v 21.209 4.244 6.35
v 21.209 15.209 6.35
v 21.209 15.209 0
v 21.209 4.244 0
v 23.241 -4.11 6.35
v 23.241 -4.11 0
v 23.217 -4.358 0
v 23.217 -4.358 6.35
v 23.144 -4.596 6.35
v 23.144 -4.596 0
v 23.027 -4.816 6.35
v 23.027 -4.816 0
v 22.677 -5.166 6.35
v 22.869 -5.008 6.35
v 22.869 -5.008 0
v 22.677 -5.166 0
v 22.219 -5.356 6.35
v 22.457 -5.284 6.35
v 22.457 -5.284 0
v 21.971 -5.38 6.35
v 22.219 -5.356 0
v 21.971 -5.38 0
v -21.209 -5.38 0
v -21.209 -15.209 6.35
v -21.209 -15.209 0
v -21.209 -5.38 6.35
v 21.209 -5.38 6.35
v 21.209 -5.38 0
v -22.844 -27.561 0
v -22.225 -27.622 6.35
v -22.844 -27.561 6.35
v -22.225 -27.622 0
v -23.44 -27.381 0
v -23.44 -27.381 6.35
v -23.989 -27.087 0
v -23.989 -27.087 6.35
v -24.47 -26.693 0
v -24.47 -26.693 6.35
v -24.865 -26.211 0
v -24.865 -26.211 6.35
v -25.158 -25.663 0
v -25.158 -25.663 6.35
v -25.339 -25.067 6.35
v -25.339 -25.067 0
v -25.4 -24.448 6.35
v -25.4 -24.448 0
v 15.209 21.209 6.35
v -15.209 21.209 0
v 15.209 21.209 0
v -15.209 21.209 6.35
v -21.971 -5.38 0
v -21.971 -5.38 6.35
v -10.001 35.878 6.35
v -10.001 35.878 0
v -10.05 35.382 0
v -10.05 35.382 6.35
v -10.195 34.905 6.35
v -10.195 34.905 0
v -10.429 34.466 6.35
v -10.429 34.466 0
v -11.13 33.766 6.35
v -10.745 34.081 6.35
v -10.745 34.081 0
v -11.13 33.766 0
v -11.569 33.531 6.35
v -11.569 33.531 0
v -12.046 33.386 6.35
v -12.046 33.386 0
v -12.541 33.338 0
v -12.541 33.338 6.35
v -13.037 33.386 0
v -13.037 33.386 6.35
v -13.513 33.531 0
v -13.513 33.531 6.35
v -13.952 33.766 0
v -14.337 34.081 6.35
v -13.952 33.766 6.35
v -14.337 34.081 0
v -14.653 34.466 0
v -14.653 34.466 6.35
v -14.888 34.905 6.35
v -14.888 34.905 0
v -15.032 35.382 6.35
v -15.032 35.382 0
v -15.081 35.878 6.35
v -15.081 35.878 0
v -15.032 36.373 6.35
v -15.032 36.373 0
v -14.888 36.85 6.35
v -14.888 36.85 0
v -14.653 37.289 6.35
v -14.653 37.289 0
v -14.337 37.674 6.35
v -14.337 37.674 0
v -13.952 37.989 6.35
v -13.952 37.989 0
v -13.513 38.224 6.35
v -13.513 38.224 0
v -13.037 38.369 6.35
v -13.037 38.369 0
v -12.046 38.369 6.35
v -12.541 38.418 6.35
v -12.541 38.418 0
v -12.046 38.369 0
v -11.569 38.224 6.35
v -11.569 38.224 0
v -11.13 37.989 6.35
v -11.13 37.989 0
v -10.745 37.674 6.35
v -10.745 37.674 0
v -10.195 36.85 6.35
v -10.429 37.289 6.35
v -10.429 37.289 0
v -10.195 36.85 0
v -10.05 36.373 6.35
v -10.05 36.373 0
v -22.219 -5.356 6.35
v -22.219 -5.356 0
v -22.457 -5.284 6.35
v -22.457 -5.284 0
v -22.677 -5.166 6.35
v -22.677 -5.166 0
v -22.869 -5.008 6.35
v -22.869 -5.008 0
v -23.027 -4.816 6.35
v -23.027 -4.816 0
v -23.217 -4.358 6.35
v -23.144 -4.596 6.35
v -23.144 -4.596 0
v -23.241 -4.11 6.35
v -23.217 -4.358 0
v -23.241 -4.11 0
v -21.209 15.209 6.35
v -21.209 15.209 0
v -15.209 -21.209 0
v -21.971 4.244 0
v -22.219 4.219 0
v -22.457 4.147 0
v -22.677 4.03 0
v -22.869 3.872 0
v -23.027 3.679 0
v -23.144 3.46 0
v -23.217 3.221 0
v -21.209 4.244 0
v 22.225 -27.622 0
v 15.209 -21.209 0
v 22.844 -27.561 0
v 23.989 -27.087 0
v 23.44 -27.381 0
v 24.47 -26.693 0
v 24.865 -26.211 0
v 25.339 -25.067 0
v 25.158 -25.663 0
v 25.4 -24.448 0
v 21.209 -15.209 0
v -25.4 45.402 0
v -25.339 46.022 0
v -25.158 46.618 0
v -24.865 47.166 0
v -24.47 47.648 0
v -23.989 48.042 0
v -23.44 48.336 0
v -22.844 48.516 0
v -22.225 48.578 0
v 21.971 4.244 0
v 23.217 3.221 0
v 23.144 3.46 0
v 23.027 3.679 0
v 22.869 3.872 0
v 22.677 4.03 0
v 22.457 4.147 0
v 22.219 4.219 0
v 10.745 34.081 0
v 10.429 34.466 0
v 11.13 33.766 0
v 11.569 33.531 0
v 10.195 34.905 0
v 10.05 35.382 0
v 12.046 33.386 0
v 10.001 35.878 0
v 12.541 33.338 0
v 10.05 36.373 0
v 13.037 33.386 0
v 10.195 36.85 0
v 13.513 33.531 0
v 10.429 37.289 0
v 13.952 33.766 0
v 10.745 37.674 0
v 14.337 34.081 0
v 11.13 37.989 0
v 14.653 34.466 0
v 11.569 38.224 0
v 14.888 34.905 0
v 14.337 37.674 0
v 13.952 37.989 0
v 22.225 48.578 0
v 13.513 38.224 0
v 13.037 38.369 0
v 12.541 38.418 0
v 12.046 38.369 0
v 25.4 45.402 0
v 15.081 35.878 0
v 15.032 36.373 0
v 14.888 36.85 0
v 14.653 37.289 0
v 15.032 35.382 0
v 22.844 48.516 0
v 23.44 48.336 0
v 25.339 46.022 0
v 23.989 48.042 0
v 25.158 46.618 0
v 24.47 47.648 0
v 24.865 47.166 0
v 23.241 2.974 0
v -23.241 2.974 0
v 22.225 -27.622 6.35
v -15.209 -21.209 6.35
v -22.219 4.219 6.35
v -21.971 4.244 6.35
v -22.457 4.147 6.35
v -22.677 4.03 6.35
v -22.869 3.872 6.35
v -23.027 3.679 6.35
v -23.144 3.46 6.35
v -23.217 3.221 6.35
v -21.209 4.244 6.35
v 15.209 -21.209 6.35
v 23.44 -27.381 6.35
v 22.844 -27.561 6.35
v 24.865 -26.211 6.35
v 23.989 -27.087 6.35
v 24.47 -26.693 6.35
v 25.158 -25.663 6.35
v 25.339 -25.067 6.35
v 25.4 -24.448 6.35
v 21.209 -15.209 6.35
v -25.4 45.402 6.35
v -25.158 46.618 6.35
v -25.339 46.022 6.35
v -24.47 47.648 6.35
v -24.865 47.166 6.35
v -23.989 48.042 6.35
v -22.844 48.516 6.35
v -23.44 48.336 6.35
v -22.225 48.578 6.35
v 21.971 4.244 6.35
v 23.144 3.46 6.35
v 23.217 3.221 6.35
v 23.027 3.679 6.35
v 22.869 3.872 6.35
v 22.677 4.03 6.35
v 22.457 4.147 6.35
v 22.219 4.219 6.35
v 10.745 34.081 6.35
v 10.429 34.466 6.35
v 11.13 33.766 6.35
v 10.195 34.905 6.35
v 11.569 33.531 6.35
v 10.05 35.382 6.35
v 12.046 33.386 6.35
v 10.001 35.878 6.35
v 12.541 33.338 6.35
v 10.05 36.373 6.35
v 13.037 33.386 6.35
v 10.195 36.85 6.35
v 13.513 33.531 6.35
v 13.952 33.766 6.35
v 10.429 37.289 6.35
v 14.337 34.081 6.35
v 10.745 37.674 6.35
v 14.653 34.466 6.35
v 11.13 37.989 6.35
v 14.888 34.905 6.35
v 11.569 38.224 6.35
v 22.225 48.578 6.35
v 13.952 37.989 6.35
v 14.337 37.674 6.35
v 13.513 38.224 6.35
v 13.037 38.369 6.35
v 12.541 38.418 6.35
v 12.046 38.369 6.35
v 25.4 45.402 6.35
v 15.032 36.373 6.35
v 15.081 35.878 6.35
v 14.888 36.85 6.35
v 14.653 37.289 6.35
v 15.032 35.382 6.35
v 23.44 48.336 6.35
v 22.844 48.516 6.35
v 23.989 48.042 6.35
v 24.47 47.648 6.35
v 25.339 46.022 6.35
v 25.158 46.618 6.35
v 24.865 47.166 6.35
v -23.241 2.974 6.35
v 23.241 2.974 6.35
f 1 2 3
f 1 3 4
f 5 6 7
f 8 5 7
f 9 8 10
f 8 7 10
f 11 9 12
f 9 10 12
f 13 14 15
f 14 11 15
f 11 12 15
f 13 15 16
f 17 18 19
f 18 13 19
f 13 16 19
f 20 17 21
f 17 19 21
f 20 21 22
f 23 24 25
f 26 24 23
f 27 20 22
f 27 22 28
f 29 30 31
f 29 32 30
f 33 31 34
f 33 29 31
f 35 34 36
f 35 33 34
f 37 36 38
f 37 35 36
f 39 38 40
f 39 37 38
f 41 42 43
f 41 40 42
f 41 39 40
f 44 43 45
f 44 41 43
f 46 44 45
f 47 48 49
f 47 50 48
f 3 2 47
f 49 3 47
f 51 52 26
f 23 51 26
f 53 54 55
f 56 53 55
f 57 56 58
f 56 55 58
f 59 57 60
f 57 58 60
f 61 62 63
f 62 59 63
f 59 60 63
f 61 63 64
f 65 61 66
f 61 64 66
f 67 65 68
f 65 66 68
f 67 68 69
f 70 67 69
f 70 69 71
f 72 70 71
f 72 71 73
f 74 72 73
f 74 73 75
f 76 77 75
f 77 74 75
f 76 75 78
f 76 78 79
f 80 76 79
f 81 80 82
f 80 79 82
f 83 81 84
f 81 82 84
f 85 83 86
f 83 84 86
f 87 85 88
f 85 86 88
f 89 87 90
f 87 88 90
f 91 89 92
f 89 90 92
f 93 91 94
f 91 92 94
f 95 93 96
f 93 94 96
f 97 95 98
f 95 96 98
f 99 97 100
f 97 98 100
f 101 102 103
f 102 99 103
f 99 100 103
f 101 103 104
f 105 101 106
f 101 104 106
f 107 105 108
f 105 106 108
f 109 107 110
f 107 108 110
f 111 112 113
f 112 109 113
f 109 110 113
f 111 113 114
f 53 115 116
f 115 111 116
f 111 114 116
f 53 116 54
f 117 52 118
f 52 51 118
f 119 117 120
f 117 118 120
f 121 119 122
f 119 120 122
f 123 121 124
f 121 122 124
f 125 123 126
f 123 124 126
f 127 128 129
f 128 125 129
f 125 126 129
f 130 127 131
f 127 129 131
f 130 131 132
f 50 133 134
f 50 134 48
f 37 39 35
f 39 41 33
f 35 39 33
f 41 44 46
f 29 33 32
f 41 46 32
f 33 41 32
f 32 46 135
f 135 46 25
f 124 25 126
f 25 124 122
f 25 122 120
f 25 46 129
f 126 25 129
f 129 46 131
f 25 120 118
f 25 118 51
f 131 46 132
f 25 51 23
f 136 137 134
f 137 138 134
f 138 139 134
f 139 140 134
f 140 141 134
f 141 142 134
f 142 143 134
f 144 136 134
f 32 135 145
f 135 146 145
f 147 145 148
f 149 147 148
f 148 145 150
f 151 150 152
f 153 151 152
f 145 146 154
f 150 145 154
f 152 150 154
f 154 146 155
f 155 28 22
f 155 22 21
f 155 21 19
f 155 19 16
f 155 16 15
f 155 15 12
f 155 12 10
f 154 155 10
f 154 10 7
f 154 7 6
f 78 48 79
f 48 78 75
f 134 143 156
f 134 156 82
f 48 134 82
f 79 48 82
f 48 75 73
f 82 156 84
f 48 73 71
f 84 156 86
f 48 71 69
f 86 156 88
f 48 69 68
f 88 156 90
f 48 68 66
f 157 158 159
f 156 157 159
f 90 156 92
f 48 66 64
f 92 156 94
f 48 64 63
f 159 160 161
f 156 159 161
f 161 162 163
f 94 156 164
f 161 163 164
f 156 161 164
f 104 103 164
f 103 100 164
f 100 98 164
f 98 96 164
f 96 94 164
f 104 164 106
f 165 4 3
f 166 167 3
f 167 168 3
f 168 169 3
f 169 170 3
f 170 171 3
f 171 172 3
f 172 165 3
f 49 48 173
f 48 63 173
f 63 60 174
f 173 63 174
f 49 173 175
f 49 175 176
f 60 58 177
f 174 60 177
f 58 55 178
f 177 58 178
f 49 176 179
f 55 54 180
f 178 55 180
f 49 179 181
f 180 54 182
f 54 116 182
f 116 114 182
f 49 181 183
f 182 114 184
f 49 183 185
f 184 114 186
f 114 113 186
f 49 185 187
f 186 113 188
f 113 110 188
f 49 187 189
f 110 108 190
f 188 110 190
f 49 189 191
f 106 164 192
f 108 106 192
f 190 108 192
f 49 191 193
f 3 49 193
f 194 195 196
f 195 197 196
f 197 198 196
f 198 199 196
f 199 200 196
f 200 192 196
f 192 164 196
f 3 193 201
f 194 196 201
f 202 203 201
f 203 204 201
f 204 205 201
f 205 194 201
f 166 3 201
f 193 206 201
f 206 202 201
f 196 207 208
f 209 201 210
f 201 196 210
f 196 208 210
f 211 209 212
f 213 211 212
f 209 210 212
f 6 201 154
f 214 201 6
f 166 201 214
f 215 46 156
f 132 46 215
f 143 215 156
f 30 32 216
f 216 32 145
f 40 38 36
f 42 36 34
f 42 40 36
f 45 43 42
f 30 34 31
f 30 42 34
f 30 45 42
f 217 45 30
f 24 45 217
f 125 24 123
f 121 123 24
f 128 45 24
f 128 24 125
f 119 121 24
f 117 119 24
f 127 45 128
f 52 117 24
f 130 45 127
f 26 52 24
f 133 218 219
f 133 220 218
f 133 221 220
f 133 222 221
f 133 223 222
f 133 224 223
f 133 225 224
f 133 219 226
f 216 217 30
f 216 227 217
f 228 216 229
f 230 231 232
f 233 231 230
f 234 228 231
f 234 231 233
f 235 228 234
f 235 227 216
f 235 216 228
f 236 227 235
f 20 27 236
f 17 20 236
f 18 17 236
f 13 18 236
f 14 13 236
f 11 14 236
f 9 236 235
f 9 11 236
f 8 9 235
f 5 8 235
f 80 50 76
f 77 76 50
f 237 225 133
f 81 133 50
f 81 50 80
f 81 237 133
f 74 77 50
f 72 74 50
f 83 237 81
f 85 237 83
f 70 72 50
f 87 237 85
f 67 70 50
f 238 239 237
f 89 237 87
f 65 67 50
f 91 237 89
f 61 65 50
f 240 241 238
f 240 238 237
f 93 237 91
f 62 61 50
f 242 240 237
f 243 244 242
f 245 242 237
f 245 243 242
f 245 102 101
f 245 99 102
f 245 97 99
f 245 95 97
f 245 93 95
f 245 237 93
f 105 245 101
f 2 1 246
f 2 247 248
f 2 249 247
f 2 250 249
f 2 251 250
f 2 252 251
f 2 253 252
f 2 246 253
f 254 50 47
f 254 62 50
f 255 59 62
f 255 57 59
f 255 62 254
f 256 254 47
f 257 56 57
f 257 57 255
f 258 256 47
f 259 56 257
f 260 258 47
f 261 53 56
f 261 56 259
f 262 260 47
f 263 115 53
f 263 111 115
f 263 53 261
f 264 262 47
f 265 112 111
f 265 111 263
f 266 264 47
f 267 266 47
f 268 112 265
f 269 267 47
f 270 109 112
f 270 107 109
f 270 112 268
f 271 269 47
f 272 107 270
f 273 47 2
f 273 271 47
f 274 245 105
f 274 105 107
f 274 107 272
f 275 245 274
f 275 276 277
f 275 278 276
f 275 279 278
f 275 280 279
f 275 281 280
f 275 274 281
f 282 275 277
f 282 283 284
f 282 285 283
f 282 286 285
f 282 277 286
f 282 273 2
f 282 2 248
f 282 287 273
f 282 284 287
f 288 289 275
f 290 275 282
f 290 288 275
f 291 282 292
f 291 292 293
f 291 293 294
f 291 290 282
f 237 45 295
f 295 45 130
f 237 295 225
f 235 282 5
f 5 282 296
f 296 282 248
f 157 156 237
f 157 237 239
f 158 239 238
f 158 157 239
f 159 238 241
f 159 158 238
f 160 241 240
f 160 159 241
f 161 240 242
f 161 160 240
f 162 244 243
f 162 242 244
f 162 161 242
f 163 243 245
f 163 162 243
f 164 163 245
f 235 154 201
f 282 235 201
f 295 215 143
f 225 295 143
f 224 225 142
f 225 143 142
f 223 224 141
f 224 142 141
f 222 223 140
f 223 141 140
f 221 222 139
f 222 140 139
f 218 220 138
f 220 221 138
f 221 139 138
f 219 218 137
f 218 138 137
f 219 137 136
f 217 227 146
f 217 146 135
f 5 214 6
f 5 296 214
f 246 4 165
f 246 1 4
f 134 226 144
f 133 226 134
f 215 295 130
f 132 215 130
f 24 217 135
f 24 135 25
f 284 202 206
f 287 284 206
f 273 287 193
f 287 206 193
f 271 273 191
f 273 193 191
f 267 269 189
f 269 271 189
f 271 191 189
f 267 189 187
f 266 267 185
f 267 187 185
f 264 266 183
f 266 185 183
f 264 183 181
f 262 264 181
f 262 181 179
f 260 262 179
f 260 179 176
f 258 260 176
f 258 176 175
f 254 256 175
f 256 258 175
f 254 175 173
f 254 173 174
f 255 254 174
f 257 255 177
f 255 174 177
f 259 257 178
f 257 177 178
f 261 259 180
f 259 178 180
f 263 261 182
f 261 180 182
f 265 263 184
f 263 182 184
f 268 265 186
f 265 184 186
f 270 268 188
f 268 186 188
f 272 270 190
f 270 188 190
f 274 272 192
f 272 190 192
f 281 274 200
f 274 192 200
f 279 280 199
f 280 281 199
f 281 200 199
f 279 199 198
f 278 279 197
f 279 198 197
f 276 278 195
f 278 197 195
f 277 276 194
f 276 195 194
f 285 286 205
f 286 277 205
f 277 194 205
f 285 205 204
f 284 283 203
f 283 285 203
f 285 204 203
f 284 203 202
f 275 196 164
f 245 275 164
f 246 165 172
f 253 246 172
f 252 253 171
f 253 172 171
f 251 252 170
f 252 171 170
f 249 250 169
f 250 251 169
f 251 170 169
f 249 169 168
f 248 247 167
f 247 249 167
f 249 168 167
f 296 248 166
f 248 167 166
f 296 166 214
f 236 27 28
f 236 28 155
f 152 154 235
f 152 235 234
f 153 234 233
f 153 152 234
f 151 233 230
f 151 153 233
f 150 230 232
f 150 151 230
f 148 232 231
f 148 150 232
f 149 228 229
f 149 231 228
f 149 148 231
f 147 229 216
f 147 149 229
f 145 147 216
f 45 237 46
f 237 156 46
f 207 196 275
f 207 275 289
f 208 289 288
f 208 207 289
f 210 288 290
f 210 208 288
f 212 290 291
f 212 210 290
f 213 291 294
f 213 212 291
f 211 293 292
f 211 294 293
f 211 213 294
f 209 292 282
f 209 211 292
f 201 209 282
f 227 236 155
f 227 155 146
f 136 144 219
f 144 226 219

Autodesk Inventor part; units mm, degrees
ref_plane "YZ Plane" through (0, 0, 0) normal (1, 0, 0) x (0, 1, 0)
ref_plane "XZ Plane" through (0, 0, 0) normal (0, 1, 0) x (-1, 0, 0)
ref_plane "XY Plane" through (0, 0, 0) normal (0, 0, 1) x (1, 0, 0)
sketch "Sketch1" plane through (0, 0, 0) normal (0, 0, 1) x (1, 0, 0)
  line L0 (-25.4, 45.4025) -> (-25.4, -24.4475)
  line L1 (-22.225, -27.6225) -> (22.225, -27.6225)
  line L2 (25.4, -24.4475) -> (25.4, 45.4025)
  line L3 (22.225, 48.5775) -> (-22.225, 48.5775)
  line L4 (0, 57.3133) -> (0, -29.6676)
  circle A0 centre (-12.5413, 35.8775) radius 2.54
  circle A1 centre (12.5412, 35.8775) radius 2.54
  arc A2 (-25.4, -24.4475) -> (-22.225, -27.6225) centre (-22.225, -24.4475) ccw
  arc A3 (22.225, -27.6225) -> (25.4, -24.4475) centre (22.225, -24.4475) ccw
  arc A4 (25.4, 45.4025) -> (22.225, 48.5775) centre (22.225, 45.4025) ccw
  arc A5 (-22.225, 48.5775) -> (-25.4, 45.4025) centre (-22.225, 45.4025) ccw
  line L5 (-55.0388, 0) -> (75.1356, 0)
  point P0 (-25.4, 48.5775)
  point P1 (-25.4, -27.6225)
  point P2 (25.4, -27.6225)
  point P3 (25.4, 48.5775)
  dimension "d10" = 50.8
  dimension "d11" = 76.2
  dimension "d12" = 5.08
  dimension "d13" = 25.0825
  dimension "d18" = 3.175
extrude "Extrusion2" add sketch "Sketch1" along normal blind 6.35
sketch "Sketch2" plane through (0, 0, 6.35) normal (0, 0, 1) x (1, 0, 0)
  line L0 (15.209, -21.209) -> (-15.209, -21.209)
  line L1 (-21.209, -15.209) -> (-21.209, 15.209)
  line L2 (-15.209, 21.209) -> (15.209, 21.209)
  line L3 (21.209, 15.209) -> (21.209, -15.209)
  line L4 (21.209, -21.209) -> (-21.209, 21.209) construction
  line L5 (-21.209, -21.209) -> (21.209, 21.209) construction
  line L6 (-21.209, 15.209) -> (-15.209, 21.209)
  line L7 (21.209, 15.209) -> (15.209, 21.209)
  line L8 (21.209, -15.209) -> (15.209, -21.209)
  line L9 (-15.209, -21.209) -> (-21.209, -15.209)
  point P0 (0, 0)
  dimension "d24" = 42.418
  dimension "d25" = 42.418
  dimension "d26" = 6
  dimension "d27" = 6
  dimension "d28" = 6
  dimension "d29" = 6
  dimension "d30" = 6
  dimension "d31" = 6
  dimension "d32" = 6
  dimension "d33" = 6
extrude "Extrusion3" cut sketch "Sketch2" against normal up to next
sketch "Sketch3" plane through (0, 0, 6.35) normal (0, 0, 1) x (1, 0, 0)
  line L0 (0, 74.5248) -> (0, -62.4529)
  line L1 (-21.209, 4.2436) -> (-23.241, 4.2436)
  line L2 (-23.241, 4.2436) -> (-23.241, -5.3802)
  line L3 (-23.241, -5.3802) -> (-21.209, -5.3802)
  line L4 (-21.209, -5.3802) -> (-21.209, 4.2436)
  line L5 (-21.209, 15.209) -> (-21.209, -15.209) projected
  line L6 (21.209, 4.2436) -> (23.241, 4.2436)
  line L7 (23.241, 4.2436) -> (23.241, -5.3802)
  line L8 (23.241, -5.3802) -> (21.209, -5.3802)
  line L9 (21.209, -5.3802) -> (21.209, 4.2436)
  point P0 (0, 0)
  point P1 (-21.209, 0)
  point P2 (21.209, 0)
  dimension "d39" = 2.032
extrude "Extrusion4" cut sketch "Sketch3" against normal up to next
fillet "Fillet1" radius 1.27 4 edges at (-23.241, 4.2436, 3.175) (-23.241, -5.3802, 3.175) (23.241, 4.2436, 3.175) (23.241, -5.3802, 3.175)
equation "\"d25\" = d24"
equation "\"d27\" = d26"
equation "\"d28\" = d26"
equation "\"d29\" = d28"
equation "\"d30\" = d26"
equation "\"d31\" = d30"
equation "\"d32\" = d26"
equation "\"d33\" = d32"
properties part number "Motor_Clamp"
